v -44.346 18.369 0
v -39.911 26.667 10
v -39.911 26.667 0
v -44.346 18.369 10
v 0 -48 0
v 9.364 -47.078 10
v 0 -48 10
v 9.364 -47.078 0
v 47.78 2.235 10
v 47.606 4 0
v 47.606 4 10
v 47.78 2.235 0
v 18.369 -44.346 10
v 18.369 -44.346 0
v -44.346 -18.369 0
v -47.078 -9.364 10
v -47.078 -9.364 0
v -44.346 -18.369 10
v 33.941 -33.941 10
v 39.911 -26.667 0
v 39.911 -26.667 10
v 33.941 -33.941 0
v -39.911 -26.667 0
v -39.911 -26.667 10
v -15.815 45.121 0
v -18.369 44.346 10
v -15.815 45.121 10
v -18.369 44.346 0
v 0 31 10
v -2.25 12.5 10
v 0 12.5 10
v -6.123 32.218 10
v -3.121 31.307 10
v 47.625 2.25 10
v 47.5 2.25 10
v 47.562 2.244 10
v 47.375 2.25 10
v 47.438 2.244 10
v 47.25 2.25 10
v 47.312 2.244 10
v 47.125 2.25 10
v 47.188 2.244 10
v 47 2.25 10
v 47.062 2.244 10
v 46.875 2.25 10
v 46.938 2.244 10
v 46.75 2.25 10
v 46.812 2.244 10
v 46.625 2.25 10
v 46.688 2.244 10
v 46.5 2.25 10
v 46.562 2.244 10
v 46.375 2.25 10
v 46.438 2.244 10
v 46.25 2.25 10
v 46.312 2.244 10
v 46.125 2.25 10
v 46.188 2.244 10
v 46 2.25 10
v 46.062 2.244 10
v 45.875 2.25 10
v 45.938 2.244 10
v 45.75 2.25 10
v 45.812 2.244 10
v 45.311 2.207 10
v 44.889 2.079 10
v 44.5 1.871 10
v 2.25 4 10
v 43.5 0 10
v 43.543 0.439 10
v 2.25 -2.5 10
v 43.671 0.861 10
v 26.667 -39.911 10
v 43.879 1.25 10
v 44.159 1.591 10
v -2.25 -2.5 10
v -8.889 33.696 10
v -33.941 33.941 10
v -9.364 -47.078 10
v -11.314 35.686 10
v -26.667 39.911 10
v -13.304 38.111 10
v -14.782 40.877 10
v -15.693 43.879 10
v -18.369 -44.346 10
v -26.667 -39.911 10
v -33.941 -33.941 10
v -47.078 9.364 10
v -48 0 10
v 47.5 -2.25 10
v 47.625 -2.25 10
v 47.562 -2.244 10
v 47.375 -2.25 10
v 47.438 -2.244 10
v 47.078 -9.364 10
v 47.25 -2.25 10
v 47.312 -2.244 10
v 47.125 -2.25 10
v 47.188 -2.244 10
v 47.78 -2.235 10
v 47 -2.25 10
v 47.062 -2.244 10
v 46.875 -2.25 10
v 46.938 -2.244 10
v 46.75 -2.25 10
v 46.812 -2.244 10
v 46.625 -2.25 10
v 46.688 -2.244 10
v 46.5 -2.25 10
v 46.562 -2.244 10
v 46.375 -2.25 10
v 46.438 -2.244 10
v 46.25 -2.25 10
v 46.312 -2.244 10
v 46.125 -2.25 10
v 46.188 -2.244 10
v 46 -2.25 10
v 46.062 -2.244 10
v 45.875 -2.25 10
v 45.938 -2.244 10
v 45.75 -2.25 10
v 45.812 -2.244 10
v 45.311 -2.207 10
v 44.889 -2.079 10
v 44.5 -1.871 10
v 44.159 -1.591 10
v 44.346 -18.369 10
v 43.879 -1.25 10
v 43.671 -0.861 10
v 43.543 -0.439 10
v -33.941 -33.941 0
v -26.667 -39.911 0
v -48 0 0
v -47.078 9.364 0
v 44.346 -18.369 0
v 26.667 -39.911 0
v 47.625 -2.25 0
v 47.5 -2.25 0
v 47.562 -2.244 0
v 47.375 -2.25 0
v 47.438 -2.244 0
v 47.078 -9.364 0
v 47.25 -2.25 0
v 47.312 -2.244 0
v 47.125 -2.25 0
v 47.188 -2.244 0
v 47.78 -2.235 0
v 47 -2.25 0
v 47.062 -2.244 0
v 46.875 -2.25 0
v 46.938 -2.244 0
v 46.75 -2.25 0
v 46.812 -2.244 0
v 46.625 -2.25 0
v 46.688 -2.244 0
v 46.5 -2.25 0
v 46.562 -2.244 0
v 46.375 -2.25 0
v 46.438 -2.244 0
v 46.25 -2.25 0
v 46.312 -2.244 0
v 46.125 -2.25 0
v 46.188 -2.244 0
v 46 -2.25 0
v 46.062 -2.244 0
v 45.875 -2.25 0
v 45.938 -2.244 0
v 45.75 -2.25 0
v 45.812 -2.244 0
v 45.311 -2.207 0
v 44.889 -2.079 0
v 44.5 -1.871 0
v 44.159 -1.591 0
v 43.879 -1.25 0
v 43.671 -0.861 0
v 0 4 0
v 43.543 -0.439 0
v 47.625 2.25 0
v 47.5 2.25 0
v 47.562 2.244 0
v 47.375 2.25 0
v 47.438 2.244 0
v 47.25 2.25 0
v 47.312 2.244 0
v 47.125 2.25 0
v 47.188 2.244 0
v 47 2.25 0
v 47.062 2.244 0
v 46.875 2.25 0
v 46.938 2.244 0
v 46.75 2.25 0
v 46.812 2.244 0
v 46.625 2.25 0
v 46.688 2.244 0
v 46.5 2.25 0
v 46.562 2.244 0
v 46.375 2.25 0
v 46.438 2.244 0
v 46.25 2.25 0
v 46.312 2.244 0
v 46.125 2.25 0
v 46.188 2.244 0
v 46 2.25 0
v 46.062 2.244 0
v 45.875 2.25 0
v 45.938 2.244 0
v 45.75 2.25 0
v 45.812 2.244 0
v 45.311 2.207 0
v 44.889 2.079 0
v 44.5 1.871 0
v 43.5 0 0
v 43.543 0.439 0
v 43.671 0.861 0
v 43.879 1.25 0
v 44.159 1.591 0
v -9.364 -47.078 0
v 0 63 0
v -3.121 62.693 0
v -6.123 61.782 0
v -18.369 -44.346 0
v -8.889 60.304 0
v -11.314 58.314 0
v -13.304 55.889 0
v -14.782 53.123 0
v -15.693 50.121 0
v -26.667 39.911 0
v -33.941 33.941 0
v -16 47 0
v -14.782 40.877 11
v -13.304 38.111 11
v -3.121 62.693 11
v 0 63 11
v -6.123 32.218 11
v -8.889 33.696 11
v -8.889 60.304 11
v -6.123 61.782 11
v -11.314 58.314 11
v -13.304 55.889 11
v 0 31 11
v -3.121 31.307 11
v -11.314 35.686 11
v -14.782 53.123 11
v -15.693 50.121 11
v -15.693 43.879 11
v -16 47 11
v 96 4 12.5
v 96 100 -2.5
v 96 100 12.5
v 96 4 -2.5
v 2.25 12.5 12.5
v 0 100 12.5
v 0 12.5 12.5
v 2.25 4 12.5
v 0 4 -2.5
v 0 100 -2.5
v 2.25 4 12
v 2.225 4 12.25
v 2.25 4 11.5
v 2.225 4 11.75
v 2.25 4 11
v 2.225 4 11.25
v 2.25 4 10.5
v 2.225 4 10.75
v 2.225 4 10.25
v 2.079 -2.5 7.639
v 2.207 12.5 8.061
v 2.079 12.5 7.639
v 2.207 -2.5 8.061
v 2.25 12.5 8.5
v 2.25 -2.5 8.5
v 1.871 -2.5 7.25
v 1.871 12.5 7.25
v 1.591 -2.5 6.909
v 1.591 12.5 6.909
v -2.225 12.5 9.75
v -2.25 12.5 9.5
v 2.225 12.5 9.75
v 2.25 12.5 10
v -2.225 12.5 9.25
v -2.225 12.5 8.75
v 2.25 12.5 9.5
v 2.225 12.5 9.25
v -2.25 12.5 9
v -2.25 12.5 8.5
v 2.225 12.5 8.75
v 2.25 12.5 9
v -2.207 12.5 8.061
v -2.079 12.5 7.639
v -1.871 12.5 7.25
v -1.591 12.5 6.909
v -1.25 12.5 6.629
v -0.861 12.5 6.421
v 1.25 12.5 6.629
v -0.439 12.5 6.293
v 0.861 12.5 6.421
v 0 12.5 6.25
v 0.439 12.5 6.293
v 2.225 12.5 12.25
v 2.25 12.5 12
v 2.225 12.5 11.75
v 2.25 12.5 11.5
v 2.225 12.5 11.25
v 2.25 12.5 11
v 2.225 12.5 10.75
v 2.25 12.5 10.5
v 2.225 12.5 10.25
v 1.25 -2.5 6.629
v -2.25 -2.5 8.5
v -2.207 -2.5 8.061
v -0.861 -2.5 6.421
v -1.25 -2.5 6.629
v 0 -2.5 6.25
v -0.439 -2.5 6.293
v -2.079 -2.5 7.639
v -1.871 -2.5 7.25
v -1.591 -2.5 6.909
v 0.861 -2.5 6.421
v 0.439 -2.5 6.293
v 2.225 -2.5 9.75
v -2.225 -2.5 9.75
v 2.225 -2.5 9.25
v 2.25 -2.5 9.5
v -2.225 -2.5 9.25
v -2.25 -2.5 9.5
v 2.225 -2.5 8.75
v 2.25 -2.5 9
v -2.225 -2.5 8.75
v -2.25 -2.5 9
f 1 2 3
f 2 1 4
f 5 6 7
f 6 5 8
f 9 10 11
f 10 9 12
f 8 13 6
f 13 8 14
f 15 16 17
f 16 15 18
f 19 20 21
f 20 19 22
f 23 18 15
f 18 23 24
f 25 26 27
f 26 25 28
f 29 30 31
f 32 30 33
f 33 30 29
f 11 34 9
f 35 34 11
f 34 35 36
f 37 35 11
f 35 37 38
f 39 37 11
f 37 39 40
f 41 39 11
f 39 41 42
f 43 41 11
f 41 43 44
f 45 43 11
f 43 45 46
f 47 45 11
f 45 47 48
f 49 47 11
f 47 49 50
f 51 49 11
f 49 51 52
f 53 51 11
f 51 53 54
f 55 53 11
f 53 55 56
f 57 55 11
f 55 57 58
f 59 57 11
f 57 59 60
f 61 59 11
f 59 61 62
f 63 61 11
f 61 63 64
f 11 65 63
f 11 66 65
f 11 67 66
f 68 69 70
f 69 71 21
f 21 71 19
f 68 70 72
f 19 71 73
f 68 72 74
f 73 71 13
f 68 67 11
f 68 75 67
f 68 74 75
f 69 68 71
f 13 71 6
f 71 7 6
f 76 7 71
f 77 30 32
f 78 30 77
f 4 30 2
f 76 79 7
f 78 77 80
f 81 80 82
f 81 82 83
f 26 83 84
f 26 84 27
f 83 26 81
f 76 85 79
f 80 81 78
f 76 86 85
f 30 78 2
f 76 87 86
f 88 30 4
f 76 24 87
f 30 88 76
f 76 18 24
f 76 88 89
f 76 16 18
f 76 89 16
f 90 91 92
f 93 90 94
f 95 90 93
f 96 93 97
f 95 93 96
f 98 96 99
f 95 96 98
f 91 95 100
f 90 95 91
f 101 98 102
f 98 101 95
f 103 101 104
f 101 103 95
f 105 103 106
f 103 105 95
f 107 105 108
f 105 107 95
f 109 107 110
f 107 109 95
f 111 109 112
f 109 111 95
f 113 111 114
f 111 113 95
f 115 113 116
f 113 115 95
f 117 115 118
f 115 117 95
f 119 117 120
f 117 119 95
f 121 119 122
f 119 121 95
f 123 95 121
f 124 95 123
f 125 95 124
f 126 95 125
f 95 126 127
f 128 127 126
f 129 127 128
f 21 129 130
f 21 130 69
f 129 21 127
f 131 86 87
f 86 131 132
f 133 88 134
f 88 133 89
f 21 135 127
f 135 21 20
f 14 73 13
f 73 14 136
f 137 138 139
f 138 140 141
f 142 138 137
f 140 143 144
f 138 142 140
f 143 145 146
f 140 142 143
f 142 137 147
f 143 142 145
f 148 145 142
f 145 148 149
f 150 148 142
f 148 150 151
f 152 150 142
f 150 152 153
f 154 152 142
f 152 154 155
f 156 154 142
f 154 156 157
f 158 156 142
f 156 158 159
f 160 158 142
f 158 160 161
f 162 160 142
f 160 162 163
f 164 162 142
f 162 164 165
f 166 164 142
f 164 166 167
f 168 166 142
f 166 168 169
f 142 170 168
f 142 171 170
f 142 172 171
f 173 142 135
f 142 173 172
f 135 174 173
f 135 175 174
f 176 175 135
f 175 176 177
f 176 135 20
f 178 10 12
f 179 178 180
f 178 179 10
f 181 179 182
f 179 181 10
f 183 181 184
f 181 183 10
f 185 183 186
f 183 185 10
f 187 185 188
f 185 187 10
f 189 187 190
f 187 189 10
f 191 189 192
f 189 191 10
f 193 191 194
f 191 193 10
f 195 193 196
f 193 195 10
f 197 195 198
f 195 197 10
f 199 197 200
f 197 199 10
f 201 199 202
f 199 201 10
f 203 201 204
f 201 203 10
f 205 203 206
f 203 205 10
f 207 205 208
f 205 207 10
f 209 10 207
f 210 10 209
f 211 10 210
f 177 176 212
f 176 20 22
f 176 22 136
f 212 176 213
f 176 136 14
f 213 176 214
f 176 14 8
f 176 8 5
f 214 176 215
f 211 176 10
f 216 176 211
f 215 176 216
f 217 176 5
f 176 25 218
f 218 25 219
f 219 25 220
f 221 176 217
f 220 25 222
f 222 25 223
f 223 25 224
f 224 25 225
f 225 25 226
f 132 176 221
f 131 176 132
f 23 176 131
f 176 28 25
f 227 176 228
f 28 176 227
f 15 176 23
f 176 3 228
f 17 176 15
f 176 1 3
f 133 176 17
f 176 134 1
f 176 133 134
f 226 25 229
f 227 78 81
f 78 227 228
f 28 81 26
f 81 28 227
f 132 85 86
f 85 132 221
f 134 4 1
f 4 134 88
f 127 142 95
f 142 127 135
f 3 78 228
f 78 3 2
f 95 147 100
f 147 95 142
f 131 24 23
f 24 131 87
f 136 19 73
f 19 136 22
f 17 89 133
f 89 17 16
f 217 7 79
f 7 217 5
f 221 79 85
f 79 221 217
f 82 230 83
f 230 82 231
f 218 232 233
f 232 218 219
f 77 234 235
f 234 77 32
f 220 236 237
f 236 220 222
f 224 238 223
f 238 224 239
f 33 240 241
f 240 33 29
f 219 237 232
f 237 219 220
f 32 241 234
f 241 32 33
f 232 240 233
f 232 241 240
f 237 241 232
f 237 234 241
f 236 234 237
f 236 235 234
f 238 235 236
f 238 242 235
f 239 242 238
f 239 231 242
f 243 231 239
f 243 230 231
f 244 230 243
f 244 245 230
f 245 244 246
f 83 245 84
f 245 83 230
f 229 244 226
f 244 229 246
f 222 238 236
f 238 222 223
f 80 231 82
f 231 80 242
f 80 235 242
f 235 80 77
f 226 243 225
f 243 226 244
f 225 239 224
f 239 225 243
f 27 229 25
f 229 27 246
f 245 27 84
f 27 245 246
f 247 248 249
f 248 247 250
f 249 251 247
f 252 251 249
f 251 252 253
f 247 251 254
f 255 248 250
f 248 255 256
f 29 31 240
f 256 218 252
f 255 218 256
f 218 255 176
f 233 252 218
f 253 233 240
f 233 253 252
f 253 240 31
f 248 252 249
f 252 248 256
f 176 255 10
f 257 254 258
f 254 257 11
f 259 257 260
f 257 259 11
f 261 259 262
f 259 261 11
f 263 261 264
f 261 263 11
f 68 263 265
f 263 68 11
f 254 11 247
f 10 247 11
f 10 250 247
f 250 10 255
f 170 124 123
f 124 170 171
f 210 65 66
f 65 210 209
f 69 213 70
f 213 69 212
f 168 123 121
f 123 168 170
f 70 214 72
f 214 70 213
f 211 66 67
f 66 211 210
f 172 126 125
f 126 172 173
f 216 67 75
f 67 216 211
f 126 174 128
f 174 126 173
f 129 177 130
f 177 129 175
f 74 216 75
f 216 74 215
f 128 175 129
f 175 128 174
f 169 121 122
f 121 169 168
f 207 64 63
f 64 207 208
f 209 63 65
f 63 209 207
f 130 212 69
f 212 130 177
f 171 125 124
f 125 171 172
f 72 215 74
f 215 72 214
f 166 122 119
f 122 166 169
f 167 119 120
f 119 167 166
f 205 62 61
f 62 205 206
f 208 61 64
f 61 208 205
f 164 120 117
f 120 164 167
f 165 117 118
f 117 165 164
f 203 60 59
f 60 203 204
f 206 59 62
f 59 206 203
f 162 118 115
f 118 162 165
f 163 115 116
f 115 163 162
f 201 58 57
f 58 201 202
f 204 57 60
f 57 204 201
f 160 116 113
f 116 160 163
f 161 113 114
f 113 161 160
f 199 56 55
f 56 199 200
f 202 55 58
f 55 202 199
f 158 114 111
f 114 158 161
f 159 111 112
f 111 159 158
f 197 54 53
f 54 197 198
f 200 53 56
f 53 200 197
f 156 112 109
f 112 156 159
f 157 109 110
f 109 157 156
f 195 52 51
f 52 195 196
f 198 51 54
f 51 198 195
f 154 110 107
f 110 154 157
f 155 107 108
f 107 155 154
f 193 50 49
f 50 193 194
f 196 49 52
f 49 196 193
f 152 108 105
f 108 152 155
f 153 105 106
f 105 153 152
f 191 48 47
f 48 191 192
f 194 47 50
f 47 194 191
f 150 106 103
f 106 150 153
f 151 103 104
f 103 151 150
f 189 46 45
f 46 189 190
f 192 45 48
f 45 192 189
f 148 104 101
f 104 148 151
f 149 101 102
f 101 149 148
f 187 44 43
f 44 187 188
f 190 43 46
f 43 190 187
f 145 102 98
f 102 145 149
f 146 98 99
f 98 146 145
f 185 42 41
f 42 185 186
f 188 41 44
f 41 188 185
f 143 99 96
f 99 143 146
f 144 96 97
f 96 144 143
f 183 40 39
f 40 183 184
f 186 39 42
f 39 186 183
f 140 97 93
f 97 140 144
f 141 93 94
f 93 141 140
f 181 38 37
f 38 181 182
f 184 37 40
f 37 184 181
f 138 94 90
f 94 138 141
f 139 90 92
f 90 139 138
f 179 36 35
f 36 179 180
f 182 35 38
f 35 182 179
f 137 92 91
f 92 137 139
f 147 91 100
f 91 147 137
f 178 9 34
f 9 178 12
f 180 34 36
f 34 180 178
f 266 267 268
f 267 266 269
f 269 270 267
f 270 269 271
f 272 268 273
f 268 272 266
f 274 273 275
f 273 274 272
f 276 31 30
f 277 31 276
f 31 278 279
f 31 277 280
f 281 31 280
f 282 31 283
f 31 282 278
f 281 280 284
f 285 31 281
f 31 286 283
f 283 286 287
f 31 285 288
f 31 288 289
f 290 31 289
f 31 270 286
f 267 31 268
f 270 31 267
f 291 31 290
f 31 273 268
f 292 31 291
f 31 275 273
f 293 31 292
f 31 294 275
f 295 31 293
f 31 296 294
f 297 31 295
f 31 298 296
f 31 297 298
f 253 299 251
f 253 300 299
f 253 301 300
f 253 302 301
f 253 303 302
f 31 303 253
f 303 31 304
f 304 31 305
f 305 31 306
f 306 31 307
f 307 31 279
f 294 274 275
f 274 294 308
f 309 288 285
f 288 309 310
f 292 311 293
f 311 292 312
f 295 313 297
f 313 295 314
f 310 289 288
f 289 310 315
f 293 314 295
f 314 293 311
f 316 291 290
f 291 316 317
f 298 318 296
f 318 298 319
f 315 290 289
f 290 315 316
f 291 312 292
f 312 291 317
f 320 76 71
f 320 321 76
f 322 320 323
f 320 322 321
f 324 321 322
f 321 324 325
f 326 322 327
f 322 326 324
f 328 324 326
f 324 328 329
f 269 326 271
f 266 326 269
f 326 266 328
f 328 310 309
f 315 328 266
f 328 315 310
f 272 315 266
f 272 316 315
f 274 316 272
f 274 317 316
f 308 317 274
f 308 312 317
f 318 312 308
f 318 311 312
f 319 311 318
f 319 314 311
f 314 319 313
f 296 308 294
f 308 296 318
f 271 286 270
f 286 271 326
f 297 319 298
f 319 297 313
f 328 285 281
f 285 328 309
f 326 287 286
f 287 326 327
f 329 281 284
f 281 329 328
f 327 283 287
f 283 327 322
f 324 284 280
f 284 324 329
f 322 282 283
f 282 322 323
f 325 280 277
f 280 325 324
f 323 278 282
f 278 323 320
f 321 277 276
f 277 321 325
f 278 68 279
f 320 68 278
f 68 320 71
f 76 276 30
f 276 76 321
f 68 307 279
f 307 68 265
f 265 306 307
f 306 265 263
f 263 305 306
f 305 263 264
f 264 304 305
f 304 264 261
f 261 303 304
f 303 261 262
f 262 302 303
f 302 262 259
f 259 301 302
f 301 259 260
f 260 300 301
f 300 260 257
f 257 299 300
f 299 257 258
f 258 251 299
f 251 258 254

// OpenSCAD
$fn = 32;
// ----------------------------------------------------------------------
// Flange: 96 x 96 x 10 mm
// ----------------------------------------------------------------------
// --- parameters (mm) ---
outer_d = 96;             // outer diameter
wall = 5;                 // wall thickness
flange_t = 10;            // flange thickness
hub_d = 32;               // hub diameter
hub_len = 18;             // hub length
bolt_d = 4.5;             // bolt hole diameter
bolt_n = 16;              // number of bolt holes
module hole_z(px, py) {
  translate([px, py, -2.5]) cylinder(h = flange_t + 5, d = bolt_d);
}
module hole_y_pz(pz) {
  /* through both flanges along the y axis */
  translate([0, -2.5, pz]) rotate([-90, 0, 0]) cylinder(h = flange_t + 5, d = bolt_d);
}
module base() {
  cylinder(h = flange_t, d = outer_d);
}
module hub() {
  translate([0, outer_d / 2 - 1, 0])
    cylinder(h = flange_t + 1, d = hub_d);
}
module flange() {
  /* flange with a hub sunk into it */
  translate([0, flange_t / 2 - 1, -2.5])
    cube([outer_d, outer_d, flange_t + 5]);
}
difference() {
  union() {
    base();
    hub();
    flange();
  }
  /* through bolts */
  for (i = [0:bolt_n - 1])
    hole_z((outer_d - bolt_d) / 2 + i * (bolt_d - 2.5) / 16, 0);
  for (i = [0:hub_len - 1])
    hole_y_pz((hub_len - 1) / 2 + i * 0.5);
}
